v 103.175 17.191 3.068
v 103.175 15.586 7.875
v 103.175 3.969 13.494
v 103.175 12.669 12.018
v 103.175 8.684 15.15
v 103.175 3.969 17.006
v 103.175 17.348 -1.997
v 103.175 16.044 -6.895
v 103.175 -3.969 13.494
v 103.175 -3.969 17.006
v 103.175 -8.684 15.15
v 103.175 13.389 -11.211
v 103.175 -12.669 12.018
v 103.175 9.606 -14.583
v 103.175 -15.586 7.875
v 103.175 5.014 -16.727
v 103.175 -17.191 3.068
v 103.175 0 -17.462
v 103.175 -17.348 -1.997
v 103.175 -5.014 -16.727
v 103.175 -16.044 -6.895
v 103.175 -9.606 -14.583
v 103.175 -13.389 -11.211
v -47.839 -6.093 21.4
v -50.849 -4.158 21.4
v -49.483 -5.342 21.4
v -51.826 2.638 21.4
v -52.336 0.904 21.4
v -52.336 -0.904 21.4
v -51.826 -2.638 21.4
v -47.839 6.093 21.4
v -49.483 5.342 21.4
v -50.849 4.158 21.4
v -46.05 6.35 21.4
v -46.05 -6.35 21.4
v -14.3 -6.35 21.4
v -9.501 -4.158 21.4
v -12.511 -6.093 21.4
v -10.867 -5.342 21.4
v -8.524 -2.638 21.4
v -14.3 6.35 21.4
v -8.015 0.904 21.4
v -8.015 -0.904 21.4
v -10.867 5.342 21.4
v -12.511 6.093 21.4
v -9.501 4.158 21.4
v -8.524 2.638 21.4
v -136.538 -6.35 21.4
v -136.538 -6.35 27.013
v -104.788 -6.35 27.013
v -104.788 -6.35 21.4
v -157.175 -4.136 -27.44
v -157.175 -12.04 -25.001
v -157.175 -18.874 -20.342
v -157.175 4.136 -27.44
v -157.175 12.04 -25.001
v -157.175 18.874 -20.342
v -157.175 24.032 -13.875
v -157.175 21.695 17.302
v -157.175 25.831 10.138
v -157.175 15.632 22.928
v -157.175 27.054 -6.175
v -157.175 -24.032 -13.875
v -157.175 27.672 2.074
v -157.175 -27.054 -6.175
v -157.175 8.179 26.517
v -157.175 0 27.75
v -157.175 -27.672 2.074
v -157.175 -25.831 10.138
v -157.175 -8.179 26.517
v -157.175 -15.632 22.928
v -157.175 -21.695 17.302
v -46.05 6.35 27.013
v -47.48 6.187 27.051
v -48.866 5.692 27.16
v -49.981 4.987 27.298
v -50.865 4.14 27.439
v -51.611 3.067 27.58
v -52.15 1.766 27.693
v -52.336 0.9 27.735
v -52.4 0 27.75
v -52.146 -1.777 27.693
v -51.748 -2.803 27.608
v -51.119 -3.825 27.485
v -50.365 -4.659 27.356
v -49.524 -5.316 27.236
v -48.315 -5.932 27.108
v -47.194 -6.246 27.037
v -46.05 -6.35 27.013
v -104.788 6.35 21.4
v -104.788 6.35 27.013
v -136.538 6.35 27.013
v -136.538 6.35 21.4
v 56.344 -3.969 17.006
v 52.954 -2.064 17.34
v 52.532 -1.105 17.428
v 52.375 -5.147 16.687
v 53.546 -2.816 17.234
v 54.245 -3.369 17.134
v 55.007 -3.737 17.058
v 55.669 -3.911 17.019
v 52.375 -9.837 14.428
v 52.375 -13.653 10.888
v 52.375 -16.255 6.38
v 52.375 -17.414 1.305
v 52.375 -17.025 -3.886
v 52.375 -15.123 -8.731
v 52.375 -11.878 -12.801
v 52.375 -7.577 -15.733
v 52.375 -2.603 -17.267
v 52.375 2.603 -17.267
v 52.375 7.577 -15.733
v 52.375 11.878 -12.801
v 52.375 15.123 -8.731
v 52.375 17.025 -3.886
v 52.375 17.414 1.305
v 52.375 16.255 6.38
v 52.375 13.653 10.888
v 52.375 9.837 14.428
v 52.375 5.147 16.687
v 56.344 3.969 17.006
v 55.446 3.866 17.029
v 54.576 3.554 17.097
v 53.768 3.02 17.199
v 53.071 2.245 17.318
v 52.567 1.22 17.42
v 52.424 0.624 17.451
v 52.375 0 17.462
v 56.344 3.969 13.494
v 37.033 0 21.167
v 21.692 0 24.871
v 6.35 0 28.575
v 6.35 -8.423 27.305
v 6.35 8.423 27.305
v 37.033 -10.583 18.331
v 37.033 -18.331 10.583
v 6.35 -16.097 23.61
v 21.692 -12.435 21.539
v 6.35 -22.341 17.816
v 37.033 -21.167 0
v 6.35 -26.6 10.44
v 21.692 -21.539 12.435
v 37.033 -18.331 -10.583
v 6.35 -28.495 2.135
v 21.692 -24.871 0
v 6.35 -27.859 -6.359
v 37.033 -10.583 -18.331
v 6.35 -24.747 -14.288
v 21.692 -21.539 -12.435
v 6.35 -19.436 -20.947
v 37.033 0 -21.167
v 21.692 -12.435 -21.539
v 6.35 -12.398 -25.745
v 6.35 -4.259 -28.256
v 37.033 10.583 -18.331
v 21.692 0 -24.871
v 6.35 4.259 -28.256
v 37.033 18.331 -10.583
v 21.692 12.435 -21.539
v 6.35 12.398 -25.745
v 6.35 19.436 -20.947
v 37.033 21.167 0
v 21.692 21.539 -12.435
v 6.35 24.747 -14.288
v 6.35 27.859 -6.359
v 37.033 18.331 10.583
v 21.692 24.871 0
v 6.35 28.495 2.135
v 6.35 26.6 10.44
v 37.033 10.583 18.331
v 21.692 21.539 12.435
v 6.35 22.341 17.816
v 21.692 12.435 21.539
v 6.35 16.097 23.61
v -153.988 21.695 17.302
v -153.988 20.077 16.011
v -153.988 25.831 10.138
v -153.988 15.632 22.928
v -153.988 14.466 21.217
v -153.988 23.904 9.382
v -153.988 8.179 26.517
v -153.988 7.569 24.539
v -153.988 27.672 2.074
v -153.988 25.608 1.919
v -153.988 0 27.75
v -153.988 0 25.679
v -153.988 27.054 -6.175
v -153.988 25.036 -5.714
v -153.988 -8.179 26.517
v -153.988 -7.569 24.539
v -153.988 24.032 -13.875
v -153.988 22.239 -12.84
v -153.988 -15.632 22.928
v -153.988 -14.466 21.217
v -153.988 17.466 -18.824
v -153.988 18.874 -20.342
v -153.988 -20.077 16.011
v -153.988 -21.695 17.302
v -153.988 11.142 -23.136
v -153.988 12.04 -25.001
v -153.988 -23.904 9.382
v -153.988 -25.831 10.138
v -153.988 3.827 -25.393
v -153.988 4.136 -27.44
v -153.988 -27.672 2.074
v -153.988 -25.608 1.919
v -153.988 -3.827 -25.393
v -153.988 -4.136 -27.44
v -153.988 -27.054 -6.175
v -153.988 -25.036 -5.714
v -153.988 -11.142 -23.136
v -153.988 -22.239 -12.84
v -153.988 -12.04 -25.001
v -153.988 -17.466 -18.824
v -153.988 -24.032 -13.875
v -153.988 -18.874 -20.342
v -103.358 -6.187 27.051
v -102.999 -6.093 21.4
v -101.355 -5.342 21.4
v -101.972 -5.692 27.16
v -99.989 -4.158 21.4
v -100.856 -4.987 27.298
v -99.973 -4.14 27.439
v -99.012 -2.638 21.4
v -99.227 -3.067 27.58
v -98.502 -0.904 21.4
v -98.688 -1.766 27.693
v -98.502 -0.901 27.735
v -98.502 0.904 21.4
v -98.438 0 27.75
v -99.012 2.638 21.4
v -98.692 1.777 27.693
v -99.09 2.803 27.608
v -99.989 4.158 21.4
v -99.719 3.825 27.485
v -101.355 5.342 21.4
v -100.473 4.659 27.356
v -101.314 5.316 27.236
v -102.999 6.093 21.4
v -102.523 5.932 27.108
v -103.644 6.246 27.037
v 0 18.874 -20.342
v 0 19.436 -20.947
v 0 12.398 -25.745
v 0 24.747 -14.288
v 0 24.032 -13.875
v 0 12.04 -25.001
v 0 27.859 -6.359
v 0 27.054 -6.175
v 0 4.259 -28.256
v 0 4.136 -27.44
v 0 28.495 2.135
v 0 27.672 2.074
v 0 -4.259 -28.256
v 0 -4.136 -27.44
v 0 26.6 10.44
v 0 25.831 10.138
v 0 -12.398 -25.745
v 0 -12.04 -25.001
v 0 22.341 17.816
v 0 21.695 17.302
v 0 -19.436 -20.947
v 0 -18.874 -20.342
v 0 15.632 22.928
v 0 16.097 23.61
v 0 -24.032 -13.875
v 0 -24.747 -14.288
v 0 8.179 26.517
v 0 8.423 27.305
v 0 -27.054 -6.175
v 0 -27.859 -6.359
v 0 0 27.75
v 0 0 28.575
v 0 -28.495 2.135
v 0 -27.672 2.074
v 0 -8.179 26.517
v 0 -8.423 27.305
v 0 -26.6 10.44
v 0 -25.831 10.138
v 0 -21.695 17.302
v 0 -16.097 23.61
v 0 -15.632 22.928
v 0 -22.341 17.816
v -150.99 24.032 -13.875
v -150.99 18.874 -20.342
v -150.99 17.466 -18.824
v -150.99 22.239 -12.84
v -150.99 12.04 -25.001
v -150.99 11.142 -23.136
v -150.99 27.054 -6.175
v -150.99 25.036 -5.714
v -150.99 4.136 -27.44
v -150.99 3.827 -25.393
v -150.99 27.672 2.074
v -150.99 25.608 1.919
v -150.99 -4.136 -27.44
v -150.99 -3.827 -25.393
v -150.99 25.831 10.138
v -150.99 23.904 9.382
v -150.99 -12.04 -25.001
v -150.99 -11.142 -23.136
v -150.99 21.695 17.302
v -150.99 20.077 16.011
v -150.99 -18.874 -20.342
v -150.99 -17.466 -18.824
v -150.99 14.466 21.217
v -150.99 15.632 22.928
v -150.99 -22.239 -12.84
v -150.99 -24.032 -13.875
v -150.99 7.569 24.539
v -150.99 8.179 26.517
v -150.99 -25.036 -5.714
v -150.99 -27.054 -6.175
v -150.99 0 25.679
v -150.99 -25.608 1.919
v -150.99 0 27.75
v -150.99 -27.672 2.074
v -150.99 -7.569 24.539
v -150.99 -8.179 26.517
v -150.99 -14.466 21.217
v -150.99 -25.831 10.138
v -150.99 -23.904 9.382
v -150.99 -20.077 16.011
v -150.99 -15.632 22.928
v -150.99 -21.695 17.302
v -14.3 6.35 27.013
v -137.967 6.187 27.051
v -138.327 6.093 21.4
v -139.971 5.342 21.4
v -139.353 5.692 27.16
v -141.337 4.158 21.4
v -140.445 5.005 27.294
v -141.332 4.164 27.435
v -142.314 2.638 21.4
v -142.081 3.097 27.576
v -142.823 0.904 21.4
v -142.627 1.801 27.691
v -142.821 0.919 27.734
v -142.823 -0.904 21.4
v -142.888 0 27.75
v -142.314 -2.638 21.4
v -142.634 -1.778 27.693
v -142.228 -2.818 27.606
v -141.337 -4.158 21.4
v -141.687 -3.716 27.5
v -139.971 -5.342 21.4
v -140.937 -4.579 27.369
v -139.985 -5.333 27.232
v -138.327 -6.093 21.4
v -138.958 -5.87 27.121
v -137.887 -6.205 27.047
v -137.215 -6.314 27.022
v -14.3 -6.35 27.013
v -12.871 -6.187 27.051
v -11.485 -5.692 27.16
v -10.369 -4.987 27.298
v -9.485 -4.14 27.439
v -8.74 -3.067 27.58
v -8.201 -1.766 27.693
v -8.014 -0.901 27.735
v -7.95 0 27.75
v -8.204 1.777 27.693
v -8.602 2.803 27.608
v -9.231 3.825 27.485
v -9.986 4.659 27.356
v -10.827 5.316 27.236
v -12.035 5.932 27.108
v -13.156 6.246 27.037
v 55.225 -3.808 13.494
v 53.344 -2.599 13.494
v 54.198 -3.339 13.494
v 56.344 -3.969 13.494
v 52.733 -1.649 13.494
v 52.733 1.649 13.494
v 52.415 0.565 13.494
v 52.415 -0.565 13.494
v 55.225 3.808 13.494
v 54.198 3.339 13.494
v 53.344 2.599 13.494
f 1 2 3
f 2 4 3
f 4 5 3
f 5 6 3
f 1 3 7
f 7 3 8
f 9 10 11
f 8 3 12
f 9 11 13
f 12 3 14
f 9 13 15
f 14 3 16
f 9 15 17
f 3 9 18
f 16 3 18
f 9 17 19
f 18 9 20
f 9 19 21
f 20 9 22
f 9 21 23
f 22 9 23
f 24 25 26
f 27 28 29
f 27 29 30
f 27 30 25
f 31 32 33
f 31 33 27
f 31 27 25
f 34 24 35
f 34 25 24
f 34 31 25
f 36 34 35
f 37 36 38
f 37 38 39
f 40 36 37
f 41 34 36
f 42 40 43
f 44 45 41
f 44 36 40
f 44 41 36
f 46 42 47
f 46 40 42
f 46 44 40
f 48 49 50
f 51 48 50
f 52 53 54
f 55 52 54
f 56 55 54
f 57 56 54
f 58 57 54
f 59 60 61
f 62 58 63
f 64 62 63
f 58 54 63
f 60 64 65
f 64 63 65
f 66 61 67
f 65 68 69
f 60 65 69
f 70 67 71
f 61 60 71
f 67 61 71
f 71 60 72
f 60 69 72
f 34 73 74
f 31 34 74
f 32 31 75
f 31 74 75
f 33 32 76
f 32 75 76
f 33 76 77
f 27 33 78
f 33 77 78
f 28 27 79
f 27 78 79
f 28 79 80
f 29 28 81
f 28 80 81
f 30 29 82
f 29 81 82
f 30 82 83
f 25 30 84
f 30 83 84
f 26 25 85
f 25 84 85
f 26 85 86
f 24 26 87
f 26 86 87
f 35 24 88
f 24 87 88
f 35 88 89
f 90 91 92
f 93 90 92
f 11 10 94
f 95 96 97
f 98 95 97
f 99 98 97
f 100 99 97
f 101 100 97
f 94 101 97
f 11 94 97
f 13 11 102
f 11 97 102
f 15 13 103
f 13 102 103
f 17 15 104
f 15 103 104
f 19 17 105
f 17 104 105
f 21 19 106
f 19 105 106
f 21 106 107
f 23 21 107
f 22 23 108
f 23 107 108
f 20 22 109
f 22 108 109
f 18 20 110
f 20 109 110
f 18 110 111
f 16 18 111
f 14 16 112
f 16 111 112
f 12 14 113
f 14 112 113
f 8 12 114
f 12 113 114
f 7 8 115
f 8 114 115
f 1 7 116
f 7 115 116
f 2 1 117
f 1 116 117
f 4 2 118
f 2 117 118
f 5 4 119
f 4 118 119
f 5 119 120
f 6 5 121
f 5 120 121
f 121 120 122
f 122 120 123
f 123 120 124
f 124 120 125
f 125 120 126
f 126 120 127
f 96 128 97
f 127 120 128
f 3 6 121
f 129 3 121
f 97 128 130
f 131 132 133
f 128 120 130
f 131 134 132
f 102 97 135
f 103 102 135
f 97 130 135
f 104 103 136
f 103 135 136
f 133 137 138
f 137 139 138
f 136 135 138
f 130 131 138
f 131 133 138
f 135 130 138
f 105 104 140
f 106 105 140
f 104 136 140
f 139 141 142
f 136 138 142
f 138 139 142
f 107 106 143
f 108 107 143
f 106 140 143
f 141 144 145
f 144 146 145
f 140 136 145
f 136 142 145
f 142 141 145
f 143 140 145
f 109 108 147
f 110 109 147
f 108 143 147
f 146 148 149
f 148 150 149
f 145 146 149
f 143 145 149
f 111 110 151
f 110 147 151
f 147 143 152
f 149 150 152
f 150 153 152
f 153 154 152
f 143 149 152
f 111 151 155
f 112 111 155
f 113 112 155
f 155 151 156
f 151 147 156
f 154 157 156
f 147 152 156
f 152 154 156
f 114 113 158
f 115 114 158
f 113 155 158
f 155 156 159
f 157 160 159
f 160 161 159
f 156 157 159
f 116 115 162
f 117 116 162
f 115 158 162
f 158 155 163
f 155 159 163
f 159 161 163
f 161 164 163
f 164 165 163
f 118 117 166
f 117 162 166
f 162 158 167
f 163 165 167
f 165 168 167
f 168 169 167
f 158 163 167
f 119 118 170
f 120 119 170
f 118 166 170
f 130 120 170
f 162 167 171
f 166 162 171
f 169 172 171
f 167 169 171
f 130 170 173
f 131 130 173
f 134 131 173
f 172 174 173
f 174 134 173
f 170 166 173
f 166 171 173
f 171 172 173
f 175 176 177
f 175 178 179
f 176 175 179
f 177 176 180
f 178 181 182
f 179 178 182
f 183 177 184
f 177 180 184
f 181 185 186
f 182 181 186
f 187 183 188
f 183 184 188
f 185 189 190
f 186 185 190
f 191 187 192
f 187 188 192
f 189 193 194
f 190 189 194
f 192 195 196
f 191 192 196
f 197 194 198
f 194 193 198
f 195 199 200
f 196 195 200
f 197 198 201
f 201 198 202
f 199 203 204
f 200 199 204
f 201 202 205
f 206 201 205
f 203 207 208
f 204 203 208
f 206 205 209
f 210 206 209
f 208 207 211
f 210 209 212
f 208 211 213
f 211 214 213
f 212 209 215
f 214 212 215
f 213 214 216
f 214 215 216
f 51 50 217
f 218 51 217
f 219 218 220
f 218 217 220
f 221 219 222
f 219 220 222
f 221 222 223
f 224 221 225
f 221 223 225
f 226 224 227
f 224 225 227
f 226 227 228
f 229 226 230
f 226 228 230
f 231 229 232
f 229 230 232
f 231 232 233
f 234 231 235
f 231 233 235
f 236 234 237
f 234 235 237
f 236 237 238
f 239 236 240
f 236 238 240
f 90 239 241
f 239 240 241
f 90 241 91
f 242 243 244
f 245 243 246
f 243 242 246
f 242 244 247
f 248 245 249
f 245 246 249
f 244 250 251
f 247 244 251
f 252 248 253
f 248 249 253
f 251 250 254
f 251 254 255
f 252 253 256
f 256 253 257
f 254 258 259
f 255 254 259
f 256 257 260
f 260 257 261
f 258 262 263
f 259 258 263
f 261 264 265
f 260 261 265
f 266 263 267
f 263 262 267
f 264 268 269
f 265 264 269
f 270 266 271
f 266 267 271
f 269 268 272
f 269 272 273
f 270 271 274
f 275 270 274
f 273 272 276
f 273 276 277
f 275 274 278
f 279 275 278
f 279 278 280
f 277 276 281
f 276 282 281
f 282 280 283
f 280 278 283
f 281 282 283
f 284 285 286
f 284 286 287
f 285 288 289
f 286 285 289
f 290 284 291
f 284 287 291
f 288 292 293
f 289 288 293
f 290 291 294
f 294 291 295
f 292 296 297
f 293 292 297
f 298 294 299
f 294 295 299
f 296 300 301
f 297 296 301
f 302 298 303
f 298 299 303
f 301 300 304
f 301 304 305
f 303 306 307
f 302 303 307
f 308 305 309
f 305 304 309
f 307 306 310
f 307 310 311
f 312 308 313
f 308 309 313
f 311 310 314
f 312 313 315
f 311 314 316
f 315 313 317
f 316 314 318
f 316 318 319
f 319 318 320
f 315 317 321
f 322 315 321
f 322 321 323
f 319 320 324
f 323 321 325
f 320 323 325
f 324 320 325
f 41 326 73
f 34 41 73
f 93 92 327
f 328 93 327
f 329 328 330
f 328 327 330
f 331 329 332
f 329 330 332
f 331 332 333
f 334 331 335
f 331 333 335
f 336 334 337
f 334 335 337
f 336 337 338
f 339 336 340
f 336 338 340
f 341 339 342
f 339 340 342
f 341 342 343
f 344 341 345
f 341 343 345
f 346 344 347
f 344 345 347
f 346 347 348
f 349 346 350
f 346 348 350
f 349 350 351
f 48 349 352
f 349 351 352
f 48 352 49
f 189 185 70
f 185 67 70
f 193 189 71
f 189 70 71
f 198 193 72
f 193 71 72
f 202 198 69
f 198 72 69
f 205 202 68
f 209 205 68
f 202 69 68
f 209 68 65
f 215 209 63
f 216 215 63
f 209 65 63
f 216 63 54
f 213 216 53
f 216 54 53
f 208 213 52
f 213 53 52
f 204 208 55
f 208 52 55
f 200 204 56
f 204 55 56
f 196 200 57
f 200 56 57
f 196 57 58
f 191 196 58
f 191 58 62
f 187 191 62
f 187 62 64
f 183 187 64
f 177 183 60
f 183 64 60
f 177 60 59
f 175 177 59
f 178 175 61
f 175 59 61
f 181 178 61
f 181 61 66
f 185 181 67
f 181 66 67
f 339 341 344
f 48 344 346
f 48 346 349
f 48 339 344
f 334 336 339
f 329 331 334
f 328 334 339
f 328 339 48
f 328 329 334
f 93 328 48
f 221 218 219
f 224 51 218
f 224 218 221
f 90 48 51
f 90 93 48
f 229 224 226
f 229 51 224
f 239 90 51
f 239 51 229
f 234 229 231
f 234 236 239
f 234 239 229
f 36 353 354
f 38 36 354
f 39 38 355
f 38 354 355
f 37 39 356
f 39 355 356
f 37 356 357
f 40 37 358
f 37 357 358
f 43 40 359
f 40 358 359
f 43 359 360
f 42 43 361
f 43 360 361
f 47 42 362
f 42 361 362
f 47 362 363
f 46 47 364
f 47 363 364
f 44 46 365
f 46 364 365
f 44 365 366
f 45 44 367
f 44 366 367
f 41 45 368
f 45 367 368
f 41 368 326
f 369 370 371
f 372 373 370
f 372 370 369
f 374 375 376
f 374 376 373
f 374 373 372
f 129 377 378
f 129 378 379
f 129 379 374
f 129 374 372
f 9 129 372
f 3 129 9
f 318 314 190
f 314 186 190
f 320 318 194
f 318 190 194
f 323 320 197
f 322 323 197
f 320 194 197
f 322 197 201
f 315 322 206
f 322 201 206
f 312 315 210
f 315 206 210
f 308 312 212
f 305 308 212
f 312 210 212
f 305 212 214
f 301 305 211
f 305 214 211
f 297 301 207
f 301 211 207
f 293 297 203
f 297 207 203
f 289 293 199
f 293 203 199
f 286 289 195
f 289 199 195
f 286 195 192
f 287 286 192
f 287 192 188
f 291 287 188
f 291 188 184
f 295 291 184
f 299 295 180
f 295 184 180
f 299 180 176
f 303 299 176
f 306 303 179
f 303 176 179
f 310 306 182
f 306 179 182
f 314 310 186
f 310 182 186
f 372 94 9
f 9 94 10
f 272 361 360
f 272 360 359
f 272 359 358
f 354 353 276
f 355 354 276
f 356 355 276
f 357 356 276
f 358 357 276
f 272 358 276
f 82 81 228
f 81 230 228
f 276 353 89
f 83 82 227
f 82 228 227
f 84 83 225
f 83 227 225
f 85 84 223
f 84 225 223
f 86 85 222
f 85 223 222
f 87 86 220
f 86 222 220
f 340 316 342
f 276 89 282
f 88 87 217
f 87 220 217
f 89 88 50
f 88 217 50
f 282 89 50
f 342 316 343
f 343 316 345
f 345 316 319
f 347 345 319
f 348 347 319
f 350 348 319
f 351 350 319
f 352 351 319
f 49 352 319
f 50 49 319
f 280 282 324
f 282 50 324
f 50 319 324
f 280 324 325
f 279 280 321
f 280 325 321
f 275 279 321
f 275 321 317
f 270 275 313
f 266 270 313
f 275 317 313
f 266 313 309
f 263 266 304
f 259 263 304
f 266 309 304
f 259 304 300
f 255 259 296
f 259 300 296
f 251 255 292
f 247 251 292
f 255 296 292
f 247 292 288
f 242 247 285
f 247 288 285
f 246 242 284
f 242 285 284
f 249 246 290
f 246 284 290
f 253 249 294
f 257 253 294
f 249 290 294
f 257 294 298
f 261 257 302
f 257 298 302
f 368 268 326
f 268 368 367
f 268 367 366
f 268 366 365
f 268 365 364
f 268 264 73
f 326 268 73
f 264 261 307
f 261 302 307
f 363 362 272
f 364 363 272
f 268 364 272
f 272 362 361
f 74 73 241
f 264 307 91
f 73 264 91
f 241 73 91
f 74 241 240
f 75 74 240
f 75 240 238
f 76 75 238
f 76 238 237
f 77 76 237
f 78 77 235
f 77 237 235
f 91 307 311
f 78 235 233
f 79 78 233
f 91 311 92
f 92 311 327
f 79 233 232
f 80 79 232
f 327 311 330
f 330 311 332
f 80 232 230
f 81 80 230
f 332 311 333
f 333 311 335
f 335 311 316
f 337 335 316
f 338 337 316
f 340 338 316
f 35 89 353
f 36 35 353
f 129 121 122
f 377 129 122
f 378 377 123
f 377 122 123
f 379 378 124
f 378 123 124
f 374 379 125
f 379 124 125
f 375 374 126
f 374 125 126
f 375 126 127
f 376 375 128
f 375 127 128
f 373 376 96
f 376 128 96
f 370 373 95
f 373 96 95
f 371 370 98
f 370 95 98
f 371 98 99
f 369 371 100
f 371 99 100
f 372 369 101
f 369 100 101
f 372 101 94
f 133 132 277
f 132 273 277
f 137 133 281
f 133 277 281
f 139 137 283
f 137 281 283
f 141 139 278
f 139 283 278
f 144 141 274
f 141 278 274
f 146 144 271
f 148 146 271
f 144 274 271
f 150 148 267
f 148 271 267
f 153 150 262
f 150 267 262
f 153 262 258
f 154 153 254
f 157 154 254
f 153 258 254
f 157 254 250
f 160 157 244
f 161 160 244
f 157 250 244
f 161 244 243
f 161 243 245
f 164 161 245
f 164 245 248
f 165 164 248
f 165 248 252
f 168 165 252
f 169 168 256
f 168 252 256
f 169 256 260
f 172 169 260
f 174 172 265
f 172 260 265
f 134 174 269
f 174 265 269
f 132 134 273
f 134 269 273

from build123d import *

# Parameters (mm, degrees)
F5_DEPTH = 6.35
F7_DEPTH = 3.96875


with BuildPart() as f1:
    # F0 (on Front) → F1 (revolve)
    with BuildSketch(Plane.XZ):
        Polygon((-157.1752, 27.7495), (-157.1752, 0), (103.1748, 0), (103.1748, 17.4625), (52.3748, 17.4625), (6.35, 28.575), (0, 28.575), (0, 27.7495), (-150.9903, 27.7495), (-150.9903, 25.6794), (-153.9875, 25.6794), (-153.9875, 27.7495), align=None)
    revolve(axis=Axis((-27.0002, 0, 0), (1, 0, 0)))

    # F4 (on offset) → F5 (cut)
    with BuildSketch(Plane.XY.offset(27.7495)):
        with BuildLine():
            Line((-104.7877, 6.35), (-136.5377, 6.35))
            ThreePointArc((-136.5377, 6.35), (-142.8877, 0), (-136.5377, -6.35))
            Line((-136.5377, -6.35), (-104.7877, -6.35))
            ThreePointArc((-104.7877, -6.35), (-98.4377, 0), (-104.7877, 6.35))
        make_face()
        with BuildLine():
            Line((-14.3002, 6.35), (-46.0502, 6.35))
            ThreePointArc((-46.0502, 6.35), (-52.4002, 0), (-46.0502, -6.35))
            Line((-46.0502, -6.35), (-14.3002, -6.35))
            ThreePointArc((-14.3002, -6.35), (-7.9502, 0), (-14.3002, 6.35))
        make_face()
    extrude(amount=-F5_DEPTH, mode=Mode.SUBTRACT)

    # F6 (on offset) → F7 (cut)
    with BuildSketch(Plane.XY.offset(17.4625)):
        with BuildLine():
            Line((103.1748, 3.96875), (56.34355, 3.96875))
            ThreePointArc((56.34355, 3.96875), (52.3748, 0), (56.34355, -3.96875))
            Line((56.34355, -3.96875), (103.1748, -3.96875))
            Line((103.1748, -3.96875), (103.1748, 3.96875))
        make_face()
    extrude(amount=-F7_DEPTH, mode=Mode.SUBTRACT)


solid = f1.part
